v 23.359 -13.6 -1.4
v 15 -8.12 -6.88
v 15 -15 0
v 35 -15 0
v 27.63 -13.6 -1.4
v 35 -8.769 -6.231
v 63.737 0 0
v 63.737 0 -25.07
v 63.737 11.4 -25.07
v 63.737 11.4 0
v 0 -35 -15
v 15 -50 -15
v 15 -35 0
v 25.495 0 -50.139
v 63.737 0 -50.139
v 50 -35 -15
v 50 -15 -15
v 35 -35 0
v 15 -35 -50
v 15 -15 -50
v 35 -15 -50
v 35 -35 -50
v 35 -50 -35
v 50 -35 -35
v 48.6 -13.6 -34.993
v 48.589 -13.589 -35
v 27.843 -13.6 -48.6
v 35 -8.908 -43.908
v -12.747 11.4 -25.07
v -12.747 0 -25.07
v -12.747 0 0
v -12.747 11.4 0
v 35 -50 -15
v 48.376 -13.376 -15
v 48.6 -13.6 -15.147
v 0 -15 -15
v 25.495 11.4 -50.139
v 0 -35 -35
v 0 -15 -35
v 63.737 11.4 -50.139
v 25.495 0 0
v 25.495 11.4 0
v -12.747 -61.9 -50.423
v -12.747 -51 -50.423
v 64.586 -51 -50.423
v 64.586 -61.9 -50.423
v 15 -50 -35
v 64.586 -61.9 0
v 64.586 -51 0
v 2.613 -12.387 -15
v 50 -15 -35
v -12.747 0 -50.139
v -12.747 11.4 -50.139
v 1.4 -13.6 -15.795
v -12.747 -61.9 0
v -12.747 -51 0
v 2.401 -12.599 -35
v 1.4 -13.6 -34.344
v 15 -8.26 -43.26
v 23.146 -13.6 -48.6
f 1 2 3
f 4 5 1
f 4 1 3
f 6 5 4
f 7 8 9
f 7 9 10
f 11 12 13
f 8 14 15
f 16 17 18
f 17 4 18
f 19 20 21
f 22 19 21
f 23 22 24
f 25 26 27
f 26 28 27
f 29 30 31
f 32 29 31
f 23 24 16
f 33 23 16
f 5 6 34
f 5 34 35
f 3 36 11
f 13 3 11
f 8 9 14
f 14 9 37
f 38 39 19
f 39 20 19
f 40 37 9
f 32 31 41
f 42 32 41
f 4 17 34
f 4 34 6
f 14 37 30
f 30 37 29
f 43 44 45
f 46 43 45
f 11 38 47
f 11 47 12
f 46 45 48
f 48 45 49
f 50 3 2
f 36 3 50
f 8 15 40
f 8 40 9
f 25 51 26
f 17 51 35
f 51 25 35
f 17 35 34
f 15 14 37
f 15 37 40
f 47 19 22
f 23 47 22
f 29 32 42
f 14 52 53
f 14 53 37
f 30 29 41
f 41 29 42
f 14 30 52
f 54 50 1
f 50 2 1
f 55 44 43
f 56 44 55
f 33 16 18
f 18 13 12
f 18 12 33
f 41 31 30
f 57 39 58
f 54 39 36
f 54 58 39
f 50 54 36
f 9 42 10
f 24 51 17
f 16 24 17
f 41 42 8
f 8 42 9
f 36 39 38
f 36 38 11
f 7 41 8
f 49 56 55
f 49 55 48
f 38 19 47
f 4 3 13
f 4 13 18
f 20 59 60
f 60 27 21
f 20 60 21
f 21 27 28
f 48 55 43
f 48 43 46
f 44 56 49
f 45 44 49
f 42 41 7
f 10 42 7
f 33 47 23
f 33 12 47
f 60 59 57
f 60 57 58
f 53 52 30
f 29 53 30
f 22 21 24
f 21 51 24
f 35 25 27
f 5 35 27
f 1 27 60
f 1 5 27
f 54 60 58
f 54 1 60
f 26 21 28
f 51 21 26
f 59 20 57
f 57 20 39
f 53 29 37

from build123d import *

# Parameters (mm, degrees)
F0_W     = 50
F0_H     = 50
F1_DEPTH = 50
F2_SIZE  = 15
F4_W     = 76.483816
F4_H     = 50.139394
F6_DEPTH = 11.4
F5_W     = 77.333644
F5_H     = 50.422661
F7_DEPTH = 10.9
F9_DEPTH = 25


with BuildPart() as f1:
    # F0 (on Front) → F1 (new body)
    with BuildSketch(Plane.XZ):
        with Locations((25, -25)):
            Rectangle(F0_W, F0_H)
    extrude(amount=F1_DEPTH)

    # F2
    f2_edges = [f1.edges().sort_by_distance(p)[0] for p in [
        (0, -25, -50),
        (50, -25, -50),
        (25, 0, -50),
        (25, -50, -50),
        (50, -25, 0),
        (50, 0, -25),
        (50, -50, -25),
        (25, -50, 0),
        (0, -50, -25),
        (0, -25, 0),
        (25, 0, 0),
        (0, 0, -25),
    ]]
    chamfer(f2_edges, length=F2_SIZE)

    # F4 (on Front) → F6 (join)
    with BuildSketch(Plane.XZ):
        with Locations((25.494605, -25.069697)):
            Rectangle(F4_W, F4_H)
    extrude(amount=-F6_DEPTH)

    # F8 (on face) → F9 (cut)
    with BuildSketch(Plane(origin=(0, 11.4, 0), x_dir=(-1, 0, 0), z_dir=(0, 1, 0))):
        Polygon((-25.494605, 0), (-63.736513, -25.069697), (-25.494605, -50.139394), (12.747303, -25.069697), align=None)
    extrude(amount=-F9_DEPTH, mode=Mode.SUBTRACT)


with BuildPart() as f7:
    # F5 (on offset) → F7 (new body)
    with BuildSketch(Plane.XZ.offset(51)):
        with Locations((25.919519, -25.21133)):
            Rectangle(F5_W, F5_H)
    extrude(amount=F7_DEPTH)


solid = Compound([f1.part, f7.part])
